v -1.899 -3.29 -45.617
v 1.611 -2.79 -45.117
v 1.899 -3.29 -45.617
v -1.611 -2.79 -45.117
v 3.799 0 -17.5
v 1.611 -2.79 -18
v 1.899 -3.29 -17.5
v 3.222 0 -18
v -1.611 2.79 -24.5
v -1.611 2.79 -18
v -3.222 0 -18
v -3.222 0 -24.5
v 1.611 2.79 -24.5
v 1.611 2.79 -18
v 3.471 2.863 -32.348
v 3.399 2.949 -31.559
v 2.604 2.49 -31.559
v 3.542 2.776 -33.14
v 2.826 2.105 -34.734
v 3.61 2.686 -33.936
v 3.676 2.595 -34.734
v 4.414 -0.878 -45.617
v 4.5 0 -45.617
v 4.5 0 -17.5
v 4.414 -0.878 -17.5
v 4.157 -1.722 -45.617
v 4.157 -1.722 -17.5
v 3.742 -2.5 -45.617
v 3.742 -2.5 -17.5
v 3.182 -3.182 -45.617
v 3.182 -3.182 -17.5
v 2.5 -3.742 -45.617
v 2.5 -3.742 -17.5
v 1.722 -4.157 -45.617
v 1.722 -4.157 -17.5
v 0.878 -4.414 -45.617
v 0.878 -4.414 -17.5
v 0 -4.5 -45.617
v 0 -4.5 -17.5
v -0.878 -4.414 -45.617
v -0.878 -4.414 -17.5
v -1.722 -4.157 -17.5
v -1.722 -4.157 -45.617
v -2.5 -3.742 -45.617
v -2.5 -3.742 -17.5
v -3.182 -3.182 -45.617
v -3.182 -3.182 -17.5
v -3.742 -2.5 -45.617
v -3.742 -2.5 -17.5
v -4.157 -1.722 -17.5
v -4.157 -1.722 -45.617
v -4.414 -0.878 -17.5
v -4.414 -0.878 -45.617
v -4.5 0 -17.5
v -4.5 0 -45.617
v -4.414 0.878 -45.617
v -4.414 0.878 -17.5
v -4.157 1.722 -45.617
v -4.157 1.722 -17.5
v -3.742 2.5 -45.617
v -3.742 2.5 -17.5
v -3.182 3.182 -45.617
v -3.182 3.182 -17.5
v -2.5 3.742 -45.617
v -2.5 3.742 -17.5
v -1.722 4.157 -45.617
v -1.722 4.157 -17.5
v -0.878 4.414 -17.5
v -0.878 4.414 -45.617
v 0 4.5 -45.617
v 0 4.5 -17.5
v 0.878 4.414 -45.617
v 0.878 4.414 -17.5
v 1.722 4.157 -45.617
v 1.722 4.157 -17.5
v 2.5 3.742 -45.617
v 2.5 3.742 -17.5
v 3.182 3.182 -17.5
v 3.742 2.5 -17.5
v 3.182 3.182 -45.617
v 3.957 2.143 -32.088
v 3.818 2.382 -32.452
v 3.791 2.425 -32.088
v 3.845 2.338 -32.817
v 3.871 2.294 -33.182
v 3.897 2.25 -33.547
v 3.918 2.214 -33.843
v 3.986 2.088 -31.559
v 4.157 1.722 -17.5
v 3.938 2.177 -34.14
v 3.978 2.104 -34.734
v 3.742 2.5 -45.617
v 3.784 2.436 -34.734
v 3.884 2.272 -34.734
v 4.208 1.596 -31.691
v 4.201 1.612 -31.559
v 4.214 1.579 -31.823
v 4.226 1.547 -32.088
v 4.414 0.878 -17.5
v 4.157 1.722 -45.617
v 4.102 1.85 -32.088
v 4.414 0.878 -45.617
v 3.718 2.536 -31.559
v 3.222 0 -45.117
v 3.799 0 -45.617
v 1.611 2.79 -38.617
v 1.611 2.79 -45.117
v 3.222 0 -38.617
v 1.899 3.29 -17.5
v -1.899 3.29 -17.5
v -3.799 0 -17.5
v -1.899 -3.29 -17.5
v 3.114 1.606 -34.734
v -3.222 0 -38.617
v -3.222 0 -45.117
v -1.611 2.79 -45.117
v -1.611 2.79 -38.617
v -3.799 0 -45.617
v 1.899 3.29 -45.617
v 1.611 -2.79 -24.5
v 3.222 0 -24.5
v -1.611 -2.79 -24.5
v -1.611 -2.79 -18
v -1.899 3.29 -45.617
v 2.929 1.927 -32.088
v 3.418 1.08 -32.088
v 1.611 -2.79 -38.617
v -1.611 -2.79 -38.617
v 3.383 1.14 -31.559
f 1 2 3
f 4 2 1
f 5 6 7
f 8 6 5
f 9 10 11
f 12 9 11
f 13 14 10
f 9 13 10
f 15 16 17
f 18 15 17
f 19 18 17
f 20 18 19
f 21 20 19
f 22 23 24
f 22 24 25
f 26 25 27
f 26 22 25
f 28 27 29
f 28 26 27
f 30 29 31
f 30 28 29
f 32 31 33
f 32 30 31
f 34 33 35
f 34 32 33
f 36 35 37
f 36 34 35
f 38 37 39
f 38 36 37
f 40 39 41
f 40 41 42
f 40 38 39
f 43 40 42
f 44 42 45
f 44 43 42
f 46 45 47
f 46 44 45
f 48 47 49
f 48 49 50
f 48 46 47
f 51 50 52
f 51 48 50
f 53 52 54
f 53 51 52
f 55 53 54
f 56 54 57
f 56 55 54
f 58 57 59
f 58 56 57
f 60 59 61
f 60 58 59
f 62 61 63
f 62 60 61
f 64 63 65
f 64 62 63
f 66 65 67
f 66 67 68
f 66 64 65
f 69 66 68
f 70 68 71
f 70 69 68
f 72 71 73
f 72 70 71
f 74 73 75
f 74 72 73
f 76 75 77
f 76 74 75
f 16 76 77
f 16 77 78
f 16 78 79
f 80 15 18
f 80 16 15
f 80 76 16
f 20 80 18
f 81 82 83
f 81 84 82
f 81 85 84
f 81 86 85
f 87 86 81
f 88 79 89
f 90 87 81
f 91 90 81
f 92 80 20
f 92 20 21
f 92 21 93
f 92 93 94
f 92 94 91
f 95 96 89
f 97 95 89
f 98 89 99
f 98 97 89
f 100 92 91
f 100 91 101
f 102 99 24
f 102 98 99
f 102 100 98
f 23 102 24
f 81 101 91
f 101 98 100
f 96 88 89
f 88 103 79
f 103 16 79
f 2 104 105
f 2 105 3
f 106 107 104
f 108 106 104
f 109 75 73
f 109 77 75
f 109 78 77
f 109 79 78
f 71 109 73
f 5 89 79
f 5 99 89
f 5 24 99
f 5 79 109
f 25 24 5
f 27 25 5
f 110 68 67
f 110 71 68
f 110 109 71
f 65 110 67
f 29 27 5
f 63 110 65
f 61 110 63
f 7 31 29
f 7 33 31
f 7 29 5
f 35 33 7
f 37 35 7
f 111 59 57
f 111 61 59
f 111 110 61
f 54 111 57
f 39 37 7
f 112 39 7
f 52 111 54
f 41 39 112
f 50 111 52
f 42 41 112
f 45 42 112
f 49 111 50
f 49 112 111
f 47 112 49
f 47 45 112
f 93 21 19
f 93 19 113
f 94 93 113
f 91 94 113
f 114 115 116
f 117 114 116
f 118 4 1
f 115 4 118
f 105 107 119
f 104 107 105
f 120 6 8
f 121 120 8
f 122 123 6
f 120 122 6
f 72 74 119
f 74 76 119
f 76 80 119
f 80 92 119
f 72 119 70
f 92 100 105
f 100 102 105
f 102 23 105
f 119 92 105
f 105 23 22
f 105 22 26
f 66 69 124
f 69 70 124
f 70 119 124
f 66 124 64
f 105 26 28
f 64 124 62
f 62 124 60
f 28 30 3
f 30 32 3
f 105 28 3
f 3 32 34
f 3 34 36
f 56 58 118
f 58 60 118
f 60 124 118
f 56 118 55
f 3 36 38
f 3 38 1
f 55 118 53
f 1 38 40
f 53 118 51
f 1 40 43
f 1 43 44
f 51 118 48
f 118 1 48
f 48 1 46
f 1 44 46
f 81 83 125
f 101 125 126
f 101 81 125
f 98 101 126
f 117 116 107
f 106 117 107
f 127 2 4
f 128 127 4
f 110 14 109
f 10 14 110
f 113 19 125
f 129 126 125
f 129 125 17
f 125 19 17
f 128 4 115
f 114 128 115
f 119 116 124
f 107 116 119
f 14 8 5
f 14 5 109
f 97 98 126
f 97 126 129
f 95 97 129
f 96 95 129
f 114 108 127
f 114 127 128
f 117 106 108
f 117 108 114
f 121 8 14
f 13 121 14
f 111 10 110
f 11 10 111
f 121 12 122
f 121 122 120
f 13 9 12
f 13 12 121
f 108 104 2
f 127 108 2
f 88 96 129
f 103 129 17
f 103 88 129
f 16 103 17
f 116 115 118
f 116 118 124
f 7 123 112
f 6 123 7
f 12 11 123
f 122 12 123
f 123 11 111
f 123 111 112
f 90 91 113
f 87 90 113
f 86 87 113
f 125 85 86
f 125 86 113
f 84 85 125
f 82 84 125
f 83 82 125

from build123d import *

# Parameters (mm, degrees)
SKETCH1_W          = 4.5
SKETCH1_H          = 28.11709914
CUT_EXTRUDE1_DEPTH = 7
CUT_EXTRUDE2_DEPTH = 7
CHAMFER1_SIZE      = 0.5
CUT_EXTRUDE3_DEPTH = 1


with BuildPart() as part:
    # Sketch1 → Revolve-Thin1 (revolve)
    with BuildSketch(Plane(origin=(0, 0, 0), x_dir=(1, 0, 0), z_dir=(0, 1, 0))):
        with Locations((2.25, 31.55854957)):
            Rectangle(SKETCH1_W, SKETCH1_H)
    revolve(axis=Axis((0, 0, 0), (0, 0, -1)))

    # Sketch2 → Cut-Extrude1 (cut)
    with BuildSketch(Plane.XY.offset(-17.5)):
        Polygon((1.610807251, 2.79), (-1.610807251, 2.79), (-3.221614502, 0), (-1.610807251, -2.79), (1.610807251, -2.79), (3.221614502, 0), align=None)
    extrude(amount=-CUT_EXTRUDE1_DEPTH, mode=Mode.SUBTRACT)

    # Sketch3 → Cut-Extrude2 (cut)
    with BuildSketch(Plane(origin=(0, 0, -45.61709914), x_dir=(-1, 0, 0), z_dir=(0, 0, -1))):
        Polygon((1.610807251, 2.79), (-1.610807251, 2.79), (-3.221614502, 0), (-1.610807251, -2.79), (1.610807251, -2.79), (3.221614502, 0), align=None)
    extrude(amount=-CUT_EXTRUDE2_DEPTH, mode=Mode.SUBTRACT)

    # Chamfer1
    chamfer1_edges = [part.edges().sort_by_distance(p)[0] for p in [
        (2.416210877, 1.395, -17.5),
        (0, 2.79, -17.5),
        (-2.416210877, 1.395, -17.5),
        (-2.416210877, -1.395, -17.5),
        (0, -2.79, -17.5),
        (2.416210877, -1.395, -17.5),
        (-2.416210877, 1.395, -45.61709914),
        (0, 2.79, -45.61709914),
        (2.416210877, 1.395, -45.61709914),
        (2.416210877, -1.395, -45.61709914),
        (0, -2.79, -45.61709914),
        (-2.416210877, -1.395, -45.61709914),
    ]]
    chamfer(chamfer1_edges, length=CHAMFER1_SIZE)

    # Sketch4 → Cut-Extrude3 (cut)
    with BuildSketch(Plane(origin=(3.897114317, 2.25, 0), x_dir=(0, 0, -1), z_dir=(0.866025404, 0.5, 0))):
        Polygon((34.73354957, 0.409595353), (34.73354957, -0.166636619), (32.087716237, 0.204797676), (32.087716237, -0.773397436), (31.55854957, -0.704707532), (31.55854957, 0.854807692), align=None)
    extrude(amount=-CUT_EXTRUDE3_DEPTH, mode=Mode.SUBTRACT)


solid = part.part
